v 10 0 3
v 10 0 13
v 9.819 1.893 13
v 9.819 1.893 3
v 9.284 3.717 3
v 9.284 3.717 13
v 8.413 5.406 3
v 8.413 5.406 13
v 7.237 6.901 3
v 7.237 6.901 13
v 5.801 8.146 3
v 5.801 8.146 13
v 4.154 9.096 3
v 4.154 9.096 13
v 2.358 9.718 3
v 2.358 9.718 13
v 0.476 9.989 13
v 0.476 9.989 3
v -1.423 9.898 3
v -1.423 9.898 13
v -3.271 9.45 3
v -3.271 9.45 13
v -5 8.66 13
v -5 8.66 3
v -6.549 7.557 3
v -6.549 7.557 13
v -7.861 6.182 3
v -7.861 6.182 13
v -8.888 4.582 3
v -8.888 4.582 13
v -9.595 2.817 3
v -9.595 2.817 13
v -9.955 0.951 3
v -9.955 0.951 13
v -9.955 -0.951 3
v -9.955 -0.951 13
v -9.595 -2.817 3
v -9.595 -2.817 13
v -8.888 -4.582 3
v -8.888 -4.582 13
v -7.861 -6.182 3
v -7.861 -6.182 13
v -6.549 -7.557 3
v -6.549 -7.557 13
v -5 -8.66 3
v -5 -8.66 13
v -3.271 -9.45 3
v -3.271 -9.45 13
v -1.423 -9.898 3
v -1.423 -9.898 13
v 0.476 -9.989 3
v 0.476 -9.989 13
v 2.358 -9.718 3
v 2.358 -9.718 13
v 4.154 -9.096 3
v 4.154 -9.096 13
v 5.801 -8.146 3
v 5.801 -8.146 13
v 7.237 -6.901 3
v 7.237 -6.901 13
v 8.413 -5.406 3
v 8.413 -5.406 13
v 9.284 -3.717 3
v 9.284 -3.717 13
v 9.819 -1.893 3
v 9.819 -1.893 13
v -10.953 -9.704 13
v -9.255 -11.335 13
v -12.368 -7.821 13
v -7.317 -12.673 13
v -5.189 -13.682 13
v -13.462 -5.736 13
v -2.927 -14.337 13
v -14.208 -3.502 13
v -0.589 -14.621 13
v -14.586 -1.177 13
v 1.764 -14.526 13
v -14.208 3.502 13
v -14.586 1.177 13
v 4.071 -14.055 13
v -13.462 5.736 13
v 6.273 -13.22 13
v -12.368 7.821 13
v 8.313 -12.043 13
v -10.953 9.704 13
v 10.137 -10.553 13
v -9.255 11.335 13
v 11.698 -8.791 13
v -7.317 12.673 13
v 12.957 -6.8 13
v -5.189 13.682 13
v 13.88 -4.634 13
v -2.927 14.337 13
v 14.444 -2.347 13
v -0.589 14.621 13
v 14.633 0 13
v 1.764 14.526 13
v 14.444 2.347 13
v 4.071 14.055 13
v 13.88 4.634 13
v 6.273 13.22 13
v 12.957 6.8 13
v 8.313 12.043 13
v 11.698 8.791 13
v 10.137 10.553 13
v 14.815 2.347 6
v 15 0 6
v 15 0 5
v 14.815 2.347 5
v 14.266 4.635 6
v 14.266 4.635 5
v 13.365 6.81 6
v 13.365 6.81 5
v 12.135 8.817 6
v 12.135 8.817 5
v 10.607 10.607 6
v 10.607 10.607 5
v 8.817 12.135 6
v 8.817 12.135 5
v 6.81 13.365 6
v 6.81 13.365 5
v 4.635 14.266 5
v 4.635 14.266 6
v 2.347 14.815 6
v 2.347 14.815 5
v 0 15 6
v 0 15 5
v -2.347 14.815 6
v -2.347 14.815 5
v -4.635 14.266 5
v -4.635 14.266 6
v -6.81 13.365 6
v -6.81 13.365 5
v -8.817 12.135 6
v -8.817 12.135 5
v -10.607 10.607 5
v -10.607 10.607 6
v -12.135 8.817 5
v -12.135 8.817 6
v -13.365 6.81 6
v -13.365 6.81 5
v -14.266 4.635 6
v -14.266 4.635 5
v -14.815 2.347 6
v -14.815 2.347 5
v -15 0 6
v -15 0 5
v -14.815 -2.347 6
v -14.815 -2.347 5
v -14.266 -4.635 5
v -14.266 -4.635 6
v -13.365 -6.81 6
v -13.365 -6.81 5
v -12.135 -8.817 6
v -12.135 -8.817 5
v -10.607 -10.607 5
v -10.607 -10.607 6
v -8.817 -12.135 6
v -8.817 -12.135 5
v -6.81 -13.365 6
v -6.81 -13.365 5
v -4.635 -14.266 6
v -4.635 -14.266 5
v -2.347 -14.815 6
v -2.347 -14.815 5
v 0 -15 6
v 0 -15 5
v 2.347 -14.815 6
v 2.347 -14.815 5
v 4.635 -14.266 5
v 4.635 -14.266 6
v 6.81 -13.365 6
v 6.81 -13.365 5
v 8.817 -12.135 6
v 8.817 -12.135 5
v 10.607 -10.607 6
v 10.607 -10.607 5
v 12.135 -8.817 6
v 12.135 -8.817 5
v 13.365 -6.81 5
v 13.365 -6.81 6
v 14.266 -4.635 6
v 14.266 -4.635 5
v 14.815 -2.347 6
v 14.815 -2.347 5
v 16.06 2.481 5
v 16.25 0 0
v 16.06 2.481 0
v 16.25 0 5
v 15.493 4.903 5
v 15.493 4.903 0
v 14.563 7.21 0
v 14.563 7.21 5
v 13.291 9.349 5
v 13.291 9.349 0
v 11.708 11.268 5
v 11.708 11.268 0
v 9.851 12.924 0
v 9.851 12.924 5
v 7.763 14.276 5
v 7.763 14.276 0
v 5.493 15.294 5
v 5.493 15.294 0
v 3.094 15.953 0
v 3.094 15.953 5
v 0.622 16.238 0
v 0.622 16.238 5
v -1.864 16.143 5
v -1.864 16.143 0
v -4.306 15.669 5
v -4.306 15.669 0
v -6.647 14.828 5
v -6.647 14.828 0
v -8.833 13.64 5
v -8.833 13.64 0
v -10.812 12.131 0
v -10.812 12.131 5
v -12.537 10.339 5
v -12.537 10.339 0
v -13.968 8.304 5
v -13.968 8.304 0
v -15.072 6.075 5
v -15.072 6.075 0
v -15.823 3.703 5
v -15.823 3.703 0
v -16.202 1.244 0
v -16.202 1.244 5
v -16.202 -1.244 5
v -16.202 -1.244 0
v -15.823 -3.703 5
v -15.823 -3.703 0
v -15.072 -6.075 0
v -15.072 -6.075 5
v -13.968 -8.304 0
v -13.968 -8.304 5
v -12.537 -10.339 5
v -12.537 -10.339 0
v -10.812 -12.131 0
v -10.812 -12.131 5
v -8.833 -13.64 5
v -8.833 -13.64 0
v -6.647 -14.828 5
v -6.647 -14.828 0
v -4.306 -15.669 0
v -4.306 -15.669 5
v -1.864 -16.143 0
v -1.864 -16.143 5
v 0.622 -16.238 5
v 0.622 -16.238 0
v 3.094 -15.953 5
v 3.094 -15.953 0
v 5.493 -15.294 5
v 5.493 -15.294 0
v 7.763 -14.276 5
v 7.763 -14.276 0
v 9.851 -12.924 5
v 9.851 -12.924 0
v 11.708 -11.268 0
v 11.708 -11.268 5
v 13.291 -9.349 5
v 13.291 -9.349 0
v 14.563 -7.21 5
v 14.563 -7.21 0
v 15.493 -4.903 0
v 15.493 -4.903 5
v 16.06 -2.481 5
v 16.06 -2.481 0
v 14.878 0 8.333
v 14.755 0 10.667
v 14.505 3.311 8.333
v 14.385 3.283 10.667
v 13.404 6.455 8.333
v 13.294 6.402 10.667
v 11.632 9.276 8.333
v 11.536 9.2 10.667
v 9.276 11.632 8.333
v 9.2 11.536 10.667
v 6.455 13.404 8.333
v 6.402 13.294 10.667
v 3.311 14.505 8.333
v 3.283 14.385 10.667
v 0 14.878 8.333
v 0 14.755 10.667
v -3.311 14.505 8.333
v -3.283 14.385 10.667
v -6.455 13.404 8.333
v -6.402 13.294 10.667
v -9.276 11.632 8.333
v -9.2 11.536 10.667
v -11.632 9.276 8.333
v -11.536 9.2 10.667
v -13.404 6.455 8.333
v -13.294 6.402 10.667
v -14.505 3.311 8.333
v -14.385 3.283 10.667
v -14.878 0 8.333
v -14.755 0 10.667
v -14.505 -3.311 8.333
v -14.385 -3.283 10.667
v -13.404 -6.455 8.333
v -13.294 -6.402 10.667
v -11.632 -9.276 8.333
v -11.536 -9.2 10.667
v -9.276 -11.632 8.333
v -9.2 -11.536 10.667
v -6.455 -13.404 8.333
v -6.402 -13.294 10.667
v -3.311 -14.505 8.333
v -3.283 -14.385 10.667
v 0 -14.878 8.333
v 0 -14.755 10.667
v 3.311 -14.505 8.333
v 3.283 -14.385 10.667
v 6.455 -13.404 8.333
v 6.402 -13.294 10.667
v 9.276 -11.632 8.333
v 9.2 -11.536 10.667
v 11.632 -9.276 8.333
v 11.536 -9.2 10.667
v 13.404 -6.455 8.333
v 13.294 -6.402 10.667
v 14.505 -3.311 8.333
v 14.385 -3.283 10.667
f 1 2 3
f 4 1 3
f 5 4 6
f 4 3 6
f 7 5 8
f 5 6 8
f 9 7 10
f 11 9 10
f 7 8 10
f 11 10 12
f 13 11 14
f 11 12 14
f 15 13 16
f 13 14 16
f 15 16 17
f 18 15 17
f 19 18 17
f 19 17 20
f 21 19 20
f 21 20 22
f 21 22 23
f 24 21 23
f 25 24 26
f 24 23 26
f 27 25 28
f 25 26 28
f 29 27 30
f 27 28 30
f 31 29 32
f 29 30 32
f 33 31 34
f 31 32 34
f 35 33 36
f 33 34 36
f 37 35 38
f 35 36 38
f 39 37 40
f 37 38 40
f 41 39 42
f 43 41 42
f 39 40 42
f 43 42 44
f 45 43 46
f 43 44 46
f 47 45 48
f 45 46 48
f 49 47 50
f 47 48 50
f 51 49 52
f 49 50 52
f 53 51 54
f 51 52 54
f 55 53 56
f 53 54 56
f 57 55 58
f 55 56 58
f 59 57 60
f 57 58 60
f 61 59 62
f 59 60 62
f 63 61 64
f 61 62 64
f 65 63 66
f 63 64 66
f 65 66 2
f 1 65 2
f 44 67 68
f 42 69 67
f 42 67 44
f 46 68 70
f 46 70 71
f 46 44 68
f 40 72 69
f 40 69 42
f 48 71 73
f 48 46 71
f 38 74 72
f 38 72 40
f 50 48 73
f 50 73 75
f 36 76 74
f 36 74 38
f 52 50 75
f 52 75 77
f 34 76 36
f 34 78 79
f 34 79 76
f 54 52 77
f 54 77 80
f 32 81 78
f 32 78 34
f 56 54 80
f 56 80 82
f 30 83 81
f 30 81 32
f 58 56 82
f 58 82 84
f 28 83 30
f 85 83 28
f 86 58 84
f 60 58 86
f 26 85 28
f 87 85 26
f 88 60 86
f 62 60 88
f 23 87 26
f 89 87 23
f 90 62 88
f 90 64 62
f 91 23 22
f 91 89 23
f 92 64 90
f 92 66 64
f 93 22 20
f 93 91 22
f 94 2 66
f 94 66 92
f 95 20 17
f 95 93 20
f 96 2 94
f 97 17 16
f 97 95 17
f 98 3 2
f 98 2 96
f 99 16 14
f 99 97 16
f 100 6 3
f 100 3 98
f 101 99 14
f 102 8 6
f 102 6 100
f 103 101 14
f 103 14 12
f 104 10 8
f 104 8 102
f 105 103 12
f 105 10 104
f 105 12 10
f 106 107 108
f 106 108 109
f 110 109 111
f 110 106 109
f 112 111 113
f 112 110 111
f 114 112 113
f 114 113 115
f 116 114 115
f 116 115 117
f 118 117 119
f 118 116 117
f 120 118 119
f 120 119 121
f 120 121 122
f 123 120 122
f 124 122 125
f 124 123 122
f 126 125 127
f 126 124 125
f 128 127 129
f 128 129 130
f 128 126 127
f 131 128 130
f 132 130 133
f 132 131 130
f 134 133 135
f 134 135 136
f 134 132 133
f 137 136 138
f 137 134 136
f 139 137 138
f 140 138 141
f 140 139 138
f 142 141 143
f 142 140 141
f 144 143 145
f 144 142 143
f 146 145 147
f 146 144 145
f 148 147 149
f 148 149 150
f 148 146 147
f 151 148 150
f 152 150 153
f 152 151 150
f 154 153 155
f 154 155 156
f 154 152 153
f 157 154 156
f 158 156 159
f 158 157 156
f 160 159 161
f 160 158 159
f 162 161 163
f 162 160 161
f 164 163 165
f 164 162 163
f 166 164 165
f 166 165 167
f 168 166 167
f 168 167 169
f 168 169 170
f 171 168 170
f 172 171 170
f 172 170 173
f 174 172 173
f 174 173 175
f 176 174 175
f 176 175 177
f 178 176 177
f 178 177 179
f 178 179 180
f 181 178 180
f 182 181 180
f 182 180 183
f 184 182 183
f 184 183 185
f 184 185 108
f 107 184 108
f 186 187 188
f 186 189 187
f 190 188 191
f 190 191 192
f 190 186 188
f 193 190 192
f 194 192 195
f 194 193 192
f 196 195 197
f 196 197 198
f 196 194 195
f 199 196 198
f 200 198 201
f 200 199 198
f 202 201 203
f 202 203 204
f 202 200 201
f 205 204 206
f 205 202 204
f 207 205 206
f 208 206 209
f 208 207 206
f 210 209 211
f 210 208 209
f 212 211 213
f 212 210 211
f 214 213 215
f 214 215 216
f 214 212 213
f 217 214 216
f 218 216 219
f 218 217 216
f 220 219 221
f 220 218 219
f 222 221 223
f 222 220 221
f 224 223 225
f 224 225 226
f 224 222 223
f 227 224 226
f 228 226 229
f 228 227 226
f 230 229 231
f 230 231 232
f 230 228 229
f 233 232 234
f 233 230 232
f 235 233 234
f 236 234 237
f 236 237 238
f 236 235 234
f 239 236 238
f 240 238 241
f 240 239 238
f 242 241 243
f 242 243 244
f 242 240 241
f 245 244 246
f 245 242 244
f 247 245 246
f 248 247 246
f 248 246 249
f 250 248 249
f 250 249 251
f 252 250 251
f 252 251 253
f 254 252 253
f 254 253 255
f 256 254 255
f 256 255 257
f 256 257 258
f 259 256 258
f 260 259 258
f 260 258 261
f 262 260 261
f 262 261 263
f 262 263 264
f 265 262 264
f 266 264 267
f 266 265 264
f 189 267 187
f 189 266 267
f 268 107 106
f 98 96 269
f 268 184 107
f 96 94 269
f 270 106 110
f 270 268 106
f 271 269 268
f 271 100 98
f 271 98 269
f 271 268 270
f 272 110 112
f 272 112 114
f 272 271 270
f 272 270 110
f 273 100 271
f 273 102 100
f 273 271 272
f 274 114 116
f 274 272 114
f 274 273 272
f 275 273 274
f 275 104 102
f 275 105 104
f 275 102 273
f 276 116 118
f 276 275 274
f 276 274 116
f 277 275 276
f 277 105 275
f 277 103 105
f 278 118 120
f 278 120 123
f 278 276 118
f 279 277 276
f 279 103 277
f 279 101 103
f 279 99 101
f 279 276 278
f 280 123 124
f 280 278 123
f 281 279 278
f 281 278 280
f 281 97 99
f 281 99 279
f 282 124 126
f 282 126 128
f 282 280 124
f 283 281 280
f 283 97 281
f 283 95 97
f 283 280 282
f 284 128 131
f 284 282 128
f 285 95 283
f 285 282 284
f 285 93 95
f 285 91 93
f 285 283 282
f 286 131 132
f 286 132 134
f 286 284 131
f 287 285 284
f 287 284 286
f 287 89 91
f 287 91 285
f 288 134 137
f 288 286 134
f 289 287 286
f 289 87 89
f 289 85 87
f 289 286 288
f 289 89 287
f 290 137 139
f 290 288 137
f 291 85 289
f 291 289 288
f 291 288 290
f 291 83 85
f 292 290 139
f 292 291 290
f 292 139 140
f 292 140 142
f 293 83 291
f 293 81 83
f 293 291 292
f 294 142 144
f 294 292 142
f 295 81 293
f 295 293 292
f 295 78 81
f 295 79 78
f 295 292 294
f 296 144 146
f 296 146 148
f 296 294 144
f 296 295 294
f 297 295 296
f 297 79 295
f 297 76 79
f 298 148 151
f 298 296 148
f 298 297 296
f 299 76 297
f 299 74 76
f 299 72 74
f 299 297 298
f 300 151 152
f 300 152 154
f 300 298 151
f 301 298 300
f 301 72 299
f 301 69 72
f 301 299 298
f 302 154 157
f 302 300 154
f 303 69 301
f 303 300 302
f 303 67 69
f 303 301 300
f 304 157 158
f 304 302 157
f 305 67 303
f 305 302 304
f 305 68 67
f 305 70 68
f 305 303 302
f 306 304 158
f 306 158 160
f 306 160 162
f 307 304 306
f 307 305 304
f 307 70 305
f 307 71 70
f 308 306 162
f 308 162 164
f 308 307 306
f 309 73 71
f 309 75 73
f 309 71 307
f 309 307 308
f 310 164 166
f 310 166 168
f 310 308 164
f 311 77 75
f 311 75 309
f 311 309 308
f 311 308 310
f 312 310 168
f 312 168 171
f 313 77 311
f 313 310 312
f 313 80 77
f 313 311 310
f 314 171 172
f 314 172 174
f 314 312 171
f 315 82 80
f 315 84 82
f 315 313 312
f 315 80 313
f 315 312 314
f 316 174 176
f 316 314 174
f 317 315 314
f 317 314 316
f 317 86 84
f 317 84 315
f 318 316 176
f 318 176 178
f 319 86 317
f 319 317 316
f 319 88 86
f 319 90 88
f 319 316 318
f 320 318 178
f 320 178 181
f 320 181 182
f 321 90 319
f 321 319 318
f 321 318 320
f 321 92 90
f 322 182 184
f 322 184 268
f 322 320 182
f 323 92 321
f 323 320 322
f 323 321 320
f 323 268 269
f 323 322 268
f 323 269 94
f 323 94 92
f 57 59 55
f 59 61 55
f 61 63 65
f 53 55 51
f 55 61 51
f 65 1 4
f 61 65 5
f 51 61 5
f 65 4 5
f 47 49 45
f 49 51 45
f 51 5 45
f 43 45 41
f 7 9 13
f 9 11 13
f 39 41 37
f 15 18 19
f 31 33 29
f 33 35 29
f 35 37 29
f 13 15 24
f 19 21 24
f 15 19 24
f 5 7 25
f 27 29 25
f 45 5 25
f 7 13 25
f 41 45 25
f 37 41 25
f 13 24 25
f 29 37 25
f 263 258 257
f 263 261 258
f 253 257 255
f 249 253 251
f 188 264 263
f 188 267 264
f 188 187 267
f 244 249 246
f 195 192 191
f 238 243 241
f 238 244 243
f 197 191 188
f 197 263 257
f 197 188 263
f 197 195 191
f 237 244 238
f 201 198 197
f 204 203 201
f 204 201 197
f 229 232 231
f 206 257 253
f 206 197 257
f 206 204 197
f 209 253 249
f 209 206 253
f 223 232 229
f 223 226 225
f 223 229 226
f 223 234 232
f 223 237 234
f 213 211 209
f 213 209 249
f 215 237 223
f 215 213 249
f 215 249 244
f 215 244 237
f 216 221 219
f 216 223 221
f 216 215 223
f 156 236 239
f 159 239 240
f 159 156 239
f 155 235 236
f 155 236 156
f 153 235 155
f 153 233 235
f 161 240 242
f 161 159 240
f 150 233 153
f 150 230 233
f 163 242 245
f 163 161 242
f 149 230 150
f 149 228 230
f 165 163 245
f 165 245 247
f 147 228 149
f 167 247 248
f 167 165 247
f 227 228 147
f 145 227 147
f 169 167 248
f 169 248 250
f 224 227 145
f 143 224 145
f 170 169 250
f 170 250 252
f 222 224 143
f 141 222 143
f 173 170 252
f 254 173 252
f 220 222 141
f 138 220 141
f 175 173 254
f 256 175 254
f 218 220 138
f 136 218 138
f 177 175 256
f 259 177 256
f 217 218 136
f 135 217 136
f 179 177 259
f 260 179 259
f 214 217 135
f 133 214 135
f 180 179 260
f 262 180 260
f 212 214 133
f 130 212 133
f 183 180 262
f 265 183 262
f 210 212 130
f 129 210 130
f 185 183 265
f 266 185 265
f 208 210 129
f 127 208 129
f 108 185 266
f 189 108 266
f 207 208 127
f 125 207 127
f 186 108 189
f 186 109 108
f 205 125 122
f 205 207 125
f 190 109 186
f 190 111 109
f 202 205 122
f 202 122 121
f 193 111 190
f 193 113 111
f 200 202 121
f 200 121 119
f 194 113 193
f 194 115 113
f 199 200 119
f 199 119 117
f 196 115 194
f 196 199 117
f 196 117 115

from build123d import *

# Parameters (mm, degrees)
CHAMFER001_ANGLE = 3
CHAMFER001_SIZE  = 7
SKETCH001_W      = 10
SKETCH001_H      = 25.260876


with BuildPart() as part:
    # Sketch052 → Revolution001 (revolve)
    with BuildSketch(Plane.XZ):
        Polygon((0, 0), (16.25, 0), (16.25, 5), (15, 5), (15, 13), (0, 13), align=None)
    revolve(axis=Axis((0, 0, 0), (0, 0, 1)))

    # Chamfer001
    chamfer001_edges = [part.edges().sort_by_distance(p)[0] for p in [
        (-15, 0, 13),
    ]]
    chamfer001_side = part.faces().sort_by_distance((-15, 0, 9))[0]
    chamfer(chamfer001_edges, length=CHAMFER001_SIZE, angle=CHAMFER001_ANGLE, reference=chamfer001_side)

    # Sketch001 → Groove001 (revolve, cut)
    with BuildSketch(Plane.XZ):
        with Locations((5, 15.630438)):
            Rectangle(SKETCH001_W, SKETCH001_H)
    revolve(axis=Axis((0, 0, 0), (0, 0, 1)), mode=Mode.SUBTRACT)


solid = part.part
